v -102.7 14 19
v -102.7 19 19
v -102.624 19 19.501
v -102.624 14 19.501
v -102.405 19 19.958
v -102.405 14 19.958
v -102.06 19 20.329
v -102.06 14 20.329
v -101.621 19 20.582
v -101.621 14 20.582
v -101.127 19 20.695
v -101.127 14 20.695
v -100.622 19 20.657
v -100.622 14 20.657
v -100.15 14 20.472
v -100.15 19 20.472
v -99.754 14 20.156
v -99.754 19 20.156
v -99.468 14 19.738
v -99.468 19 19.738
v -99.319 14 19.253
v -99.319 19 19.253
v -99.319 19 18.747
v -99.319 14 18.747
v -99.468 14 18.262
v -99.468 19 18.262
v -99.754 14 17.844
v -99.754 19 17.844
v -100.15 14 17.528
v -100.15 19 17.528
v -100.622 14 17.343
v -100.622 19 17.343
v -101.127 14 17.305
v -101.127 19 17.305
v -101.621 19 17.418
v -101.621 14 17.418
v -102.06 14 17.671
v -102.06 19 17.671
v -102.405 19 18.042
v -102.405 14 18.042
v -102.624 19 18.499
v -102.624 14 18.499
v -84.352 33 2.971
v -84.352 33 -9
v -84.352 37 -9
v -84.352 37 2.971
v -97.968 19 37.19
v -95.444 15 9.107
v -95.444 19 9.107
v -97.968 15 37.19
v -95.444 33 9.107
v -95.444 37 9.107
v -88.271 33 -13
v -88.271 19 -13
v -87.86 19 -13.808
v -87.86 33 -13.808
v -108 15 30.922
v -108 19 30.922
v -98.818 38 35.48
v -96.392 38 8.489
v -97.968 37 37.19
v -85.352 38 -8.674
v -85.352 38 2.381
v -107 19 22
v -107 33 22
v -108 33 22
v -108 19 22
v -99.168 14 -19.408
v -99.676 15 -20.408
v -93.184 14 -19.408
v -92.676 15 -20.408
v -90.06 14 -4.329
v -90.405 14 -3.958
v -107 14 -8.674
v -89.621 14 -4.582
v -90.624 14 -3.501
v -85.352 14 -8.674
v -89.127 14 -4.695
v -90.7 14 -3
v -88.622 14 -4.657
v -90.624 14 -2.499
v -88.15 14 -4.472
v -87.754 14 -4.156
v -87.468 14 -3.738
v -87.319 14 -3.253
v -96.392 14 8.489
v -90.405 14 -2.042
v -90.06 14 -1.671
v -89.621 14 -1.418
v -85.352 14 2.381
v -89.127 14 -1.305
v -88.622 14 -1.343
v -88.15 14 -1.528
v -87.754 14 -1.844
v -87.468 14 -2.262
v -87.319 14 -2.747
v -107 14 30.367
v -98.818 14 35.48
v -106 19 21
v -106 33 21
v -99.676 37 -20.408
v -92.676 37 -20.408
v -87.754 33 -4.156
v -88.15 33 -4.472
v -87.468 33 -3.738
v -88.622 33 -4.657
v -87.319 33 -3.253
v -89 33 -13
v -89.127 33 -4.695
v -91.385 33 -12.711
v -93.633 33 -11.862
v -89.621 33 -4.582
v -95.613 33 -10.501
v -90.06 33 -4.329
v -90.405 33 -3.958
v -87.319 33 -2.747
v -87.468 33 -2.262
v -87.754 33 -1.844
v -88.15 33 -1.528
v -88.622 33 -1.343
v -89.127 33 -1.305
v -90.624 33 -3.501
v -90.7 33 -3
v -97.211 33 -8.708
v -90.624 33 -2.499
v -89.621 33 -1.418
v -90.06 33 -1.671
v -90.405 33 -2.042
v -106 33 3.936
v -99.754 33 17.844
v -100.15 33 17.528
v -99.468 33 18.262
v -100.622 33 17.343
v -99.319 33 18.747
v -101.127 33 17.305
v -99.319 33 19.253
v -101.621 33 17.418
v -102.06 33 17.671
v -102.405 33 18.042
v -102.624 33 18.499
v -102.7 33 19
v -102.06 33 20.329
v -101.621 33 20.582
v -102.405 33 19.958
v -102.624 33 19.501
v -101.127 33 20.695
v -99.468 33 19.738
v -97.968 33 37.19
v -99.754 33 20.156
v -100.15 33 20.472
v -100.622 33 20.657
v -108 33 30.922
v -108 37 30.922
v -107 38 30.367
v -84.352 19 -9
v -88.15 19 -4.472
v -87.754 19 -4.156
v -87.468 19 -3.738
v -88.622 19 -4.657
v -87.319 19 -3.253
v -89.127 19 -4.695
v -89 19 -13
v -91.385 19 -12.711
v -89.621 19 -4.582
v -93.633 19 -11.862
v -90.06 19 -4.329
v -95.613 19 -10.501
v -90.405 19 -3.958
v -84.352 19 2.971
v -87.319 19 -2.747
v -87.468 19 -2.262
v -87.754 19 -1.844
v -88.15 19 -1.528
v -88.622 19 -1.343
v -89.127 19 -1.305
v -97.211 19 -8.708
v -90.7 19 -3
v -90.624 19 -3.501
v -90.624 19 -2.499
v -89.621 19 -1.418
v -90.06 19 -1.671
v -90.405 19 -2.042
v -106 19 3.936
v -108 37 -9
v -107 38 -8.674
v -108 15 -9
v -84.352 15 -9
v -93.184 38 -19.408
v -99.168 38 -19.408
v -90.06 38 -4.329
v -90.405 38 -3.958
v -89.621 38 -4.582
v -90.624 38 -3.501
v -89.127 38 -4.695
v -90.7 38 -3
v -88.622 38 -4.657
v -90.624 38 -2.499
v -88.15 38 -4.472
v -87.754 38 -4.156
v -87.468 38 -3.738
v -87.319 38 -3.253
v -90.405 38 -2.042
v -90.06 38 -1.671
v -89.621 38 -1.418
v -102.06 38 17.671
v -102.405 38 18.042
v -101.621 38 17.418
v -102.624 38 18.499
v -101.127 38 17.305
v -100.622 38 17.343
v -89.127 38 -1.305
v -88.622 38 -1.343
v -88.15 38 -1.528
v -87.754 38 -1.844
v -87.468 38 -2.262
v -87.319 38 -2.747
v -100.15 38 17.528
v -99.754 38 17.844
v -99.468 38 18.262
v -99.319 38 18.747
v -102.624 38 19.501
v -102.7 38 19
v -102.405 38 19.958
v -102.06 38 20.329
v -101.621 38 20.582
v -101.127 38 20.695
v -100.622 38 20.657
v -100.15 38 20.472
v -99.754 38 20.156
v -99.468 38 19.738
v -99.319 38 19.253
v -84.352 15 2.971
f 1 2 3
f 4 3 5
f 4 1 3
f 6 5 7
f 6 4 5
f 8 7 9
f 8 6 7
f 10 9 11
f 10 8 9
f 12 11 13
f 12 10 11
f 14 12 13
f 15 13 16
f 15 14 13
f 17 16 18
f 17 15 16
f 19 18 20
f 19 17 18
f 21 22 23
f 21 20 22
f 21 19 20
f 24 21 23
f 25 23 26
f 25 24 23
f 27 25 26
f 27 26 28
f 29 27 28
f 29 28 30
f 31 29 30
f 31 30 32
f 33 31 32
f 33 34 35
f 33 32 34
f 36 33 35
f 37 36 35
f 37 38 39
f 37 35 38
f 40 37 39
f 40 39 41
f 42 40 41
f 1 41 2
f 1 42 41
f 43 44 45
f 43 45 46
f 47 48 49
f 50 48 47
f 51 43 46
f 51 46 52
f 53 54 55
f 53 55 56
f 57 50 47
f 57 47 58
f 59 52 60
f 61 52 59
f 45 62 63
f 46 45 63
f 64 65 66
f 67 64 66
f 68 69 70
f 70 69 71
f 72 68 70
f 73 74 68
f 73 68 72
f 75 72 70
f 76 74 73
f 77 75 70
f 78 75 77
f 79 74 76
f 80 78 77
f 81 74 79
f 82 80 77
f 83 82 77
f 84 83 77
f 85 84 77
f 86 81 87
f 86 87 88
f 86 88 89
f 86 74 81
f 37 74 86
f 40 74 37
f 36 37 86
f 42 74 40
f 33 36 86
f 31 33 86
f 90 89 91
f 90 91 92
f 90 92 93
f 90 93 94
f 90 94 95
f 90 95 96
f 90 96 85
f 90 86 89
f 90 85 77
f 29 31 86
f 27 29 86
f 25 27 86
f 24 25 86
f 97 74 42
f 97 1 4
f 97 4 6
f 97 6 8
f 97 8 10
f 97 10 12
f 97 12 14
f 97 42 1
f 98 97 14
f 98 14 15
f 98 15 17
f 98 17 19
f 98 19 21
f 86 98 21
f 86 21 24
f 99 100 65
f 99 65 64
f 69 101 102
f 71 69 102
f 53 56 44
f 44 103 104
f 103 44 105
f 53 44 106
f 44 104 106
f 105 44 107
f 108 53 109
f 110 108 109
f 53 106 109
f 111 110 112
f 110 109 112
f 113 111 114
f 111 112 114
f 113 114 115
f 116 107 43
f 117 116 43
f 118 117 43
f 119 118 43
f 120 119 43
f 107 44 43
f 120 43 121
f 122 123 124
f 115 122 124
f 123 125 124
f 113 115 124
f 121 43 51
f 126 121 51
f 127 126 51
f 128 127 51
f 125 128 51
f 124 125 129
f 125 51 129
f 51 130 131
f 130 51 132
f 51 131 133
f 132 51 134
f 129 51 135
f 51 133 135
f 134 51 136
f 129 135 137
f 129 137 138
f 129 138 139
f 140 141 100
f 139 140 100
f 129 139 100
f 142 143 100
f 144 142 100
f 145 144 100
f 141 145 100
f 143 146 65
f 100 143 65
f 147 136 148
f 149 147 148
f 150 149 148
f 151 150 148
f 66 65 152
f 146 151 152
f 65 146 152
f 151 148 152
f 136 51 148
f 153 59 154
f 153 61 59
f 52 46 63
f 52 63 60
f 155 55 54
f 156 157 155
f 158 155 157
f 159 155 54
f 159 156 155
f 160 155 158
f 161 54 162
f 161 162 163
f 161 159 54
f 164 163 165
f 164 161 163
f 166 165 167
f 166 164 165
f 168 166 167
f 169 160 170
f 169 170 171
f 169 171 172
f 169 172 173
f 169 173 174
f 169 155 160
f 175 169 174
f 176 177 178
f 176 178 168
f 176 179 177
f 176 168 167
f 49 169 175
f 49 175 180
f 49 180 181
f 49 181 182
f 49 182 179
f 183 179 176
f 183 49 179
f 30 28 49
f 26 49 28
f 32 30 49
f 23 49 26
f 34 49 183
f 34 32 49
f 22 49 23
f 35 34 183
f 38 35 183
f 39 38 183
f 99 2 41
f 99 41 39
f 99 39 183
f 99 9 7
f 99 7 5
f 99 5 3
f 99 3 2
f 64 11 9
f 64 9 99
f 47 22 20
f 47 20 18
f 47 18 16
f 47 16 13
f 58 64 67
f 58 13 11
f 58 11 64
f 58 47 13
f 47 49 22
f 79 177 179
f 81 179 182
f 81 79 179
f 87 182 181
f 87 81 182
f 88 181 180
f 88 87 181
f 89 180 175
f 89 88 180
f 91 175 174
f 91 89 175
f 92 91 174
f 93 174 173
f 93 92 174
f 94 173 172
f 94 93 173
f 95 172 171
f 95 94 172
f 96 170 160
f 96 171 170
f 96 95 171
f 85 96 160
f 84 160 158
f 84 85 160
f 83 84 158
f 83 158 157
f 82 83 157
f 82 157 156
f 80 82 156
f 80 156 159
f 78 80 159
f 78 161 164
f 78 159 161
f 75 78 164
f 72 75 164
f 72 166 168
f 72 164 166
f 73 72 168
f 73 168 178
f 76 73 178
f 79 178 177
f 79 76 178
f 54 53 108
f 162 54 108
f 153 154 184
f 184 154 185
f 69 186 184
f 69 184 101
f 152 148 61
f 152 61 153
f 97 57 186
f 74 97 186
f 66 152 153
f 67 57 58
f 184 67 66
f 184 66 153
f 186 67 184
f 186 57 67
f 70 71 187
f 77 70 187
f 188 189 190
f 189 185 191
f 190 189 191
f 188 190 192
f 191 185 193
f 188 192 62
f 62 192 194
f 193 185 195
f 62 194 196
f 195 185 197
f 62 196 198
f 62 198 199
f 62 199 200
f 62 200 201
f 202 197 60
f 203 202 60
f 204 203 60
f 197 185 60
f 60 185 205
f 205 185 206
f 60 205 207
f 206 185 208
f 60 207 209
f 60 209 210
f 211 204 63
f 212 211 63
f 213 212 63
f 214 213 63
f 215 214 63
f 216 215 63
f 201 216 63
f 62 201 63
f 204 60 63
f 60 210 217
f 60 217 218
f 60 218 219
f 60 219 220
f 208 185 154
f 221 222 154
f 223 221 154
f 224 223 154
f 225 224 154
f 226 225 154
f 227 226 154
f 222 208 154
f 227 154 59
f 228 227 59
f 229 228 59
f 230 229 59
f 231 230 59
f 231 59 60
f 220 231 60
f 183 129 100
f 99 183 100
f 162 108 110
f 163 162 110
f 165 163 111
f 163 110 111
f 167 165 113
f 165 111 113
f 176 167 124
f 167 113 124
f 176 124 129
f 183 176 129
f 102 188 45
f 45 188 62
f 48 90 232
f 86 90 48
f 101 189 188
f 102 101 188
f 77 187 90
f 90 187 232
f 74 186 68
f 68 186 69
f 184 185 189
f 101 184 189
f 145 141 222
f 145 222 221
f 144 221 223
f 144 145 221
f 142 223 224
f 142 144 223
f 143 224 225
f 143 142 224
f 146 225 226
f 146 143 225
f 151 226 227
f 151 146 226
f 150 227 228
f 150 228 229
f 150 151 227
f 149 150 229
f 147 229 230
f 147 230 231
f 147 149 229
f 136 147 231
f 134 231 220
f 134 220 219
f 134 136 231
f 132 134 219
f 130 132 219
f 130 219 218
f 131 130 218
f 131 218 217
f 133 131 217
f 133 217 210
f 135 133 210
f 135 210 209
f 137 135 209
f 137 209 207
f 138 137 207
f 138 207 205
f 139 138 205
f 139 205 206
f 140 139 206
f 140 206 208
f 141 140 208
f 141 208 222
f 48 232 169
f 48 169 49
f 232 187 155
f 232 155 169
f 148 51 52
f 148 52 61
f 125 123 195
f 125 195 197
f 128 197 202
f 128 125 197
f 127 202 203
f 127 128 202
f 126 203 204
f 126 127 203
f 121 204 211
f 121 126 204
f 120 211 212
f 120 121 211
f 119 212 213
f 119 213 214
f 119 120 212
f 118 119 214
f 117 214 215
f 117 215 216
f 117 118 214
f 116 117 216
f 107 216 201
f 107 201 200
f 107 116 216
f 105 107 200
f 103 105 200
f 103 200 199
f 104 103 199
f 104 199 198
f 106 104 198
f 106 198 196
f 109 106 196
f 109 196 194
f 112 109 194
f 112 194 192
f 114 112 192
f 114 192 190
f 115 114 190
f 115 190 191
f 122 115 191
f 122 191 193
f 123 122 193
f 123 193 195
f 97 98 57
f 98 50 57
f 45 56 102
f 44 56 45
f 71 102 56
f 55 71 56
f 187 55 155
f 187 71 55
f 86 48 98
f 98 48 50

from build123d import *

# Parameters (mm, degrees)
PAD009_DEPTH    = 14
SKETCH008_R     = 1.7
PAD008_DEPTH    = 24
CHAMFER005_SIZE = 1


with BuildPart() as pad009:
    # Sketch009 → Pad009 (new body)
    with BuildSketch(Plane(origin=(0, 33, 0), x_dir=(-1, 0, 0), z_dir=(0, 1, 0))):
        with BuildLine():
            ThreePointArc((89.000023, -13), (93.632628, -11.86221), (97.21105, -8.707771))
            Line((97.21105, -8.707771), (106, 3.935782))
            Line((106, 3.935782), (106, 22))
            Line((106, 22), (112.578117, 22))
            Line((112.578117, 22), (112.578117, 42.659393))
            Line((112.578117, 42.659393), (77.159645, 42.659393))
            Line((77.159645, 42.659393), (77.159645, -13))
            Line((77.159645, -13), (89.000023, -13))
        make_face()
    extrude(amount=-PAD009_DEPTH)


with BuildPart() as foot:
    # Sketch008 → Pad008 (new body)
    with BuildSketch(Plane(origin=(0, 14, 0), x_dir=(-1, 0, 0), z_dir=(0, 1, 0))):
        Polygon((84.351819, 2.970513), (95.443832, 9.10709), (97.968148, 37.19022), (108, 30.921623), (108, -9), (99.675909, -20.407844), (92.675909, -20.407844), (84.351819, -9), align=None)
        with Locations((101, 19)):
            Circle(SKETCH008_R, mode=Mode.SUBTRACT)
        with Locations((89, -3)):
            Circle(SKETCH008_R, mode=Mode.SUBTRACT)
    extrude(amount=PAD008_DEPTH)

    # Cut014: cut Pad009
    add(pad009.part, mode=Mode.SUBTRACT)

    # Chamfer005
    chamfer005_edges = [foot.edges().sort_by_distance(p)[0] for p in [
        (-89.897825, 14, 6.038802),
        (-96.70599, 14, 23.148655),
        (-102.984074, 14, 34.055922),
        (-108, 14, 10.960812),
        (-103.837955, 14, -14.703922),
        (-96.175909, 14, -20.407844),
        (-88.513864, 14, -14.703922),
        (-84.351819, 14, -3.014744),
        (-108, 38, 10.960812),
        (-103.837955, 38, -14.703922),
        (-96.175909, 38, -20.407844),
        (-87.270544, 26, -13),
        (-88.513864, 38, -14.703922),
        (-106, 26, 22),
        (-89.897825, 38, 6.038802),
        (-96.70599, 38, 23.148655),
        (-102.984074, 38, 34.055922),
        (-84.351819, 38, -3.014744),
    ]]
    chamfer(chamfer005_edges, length=CHAMFER005_SIZE)


solid = foot.part
